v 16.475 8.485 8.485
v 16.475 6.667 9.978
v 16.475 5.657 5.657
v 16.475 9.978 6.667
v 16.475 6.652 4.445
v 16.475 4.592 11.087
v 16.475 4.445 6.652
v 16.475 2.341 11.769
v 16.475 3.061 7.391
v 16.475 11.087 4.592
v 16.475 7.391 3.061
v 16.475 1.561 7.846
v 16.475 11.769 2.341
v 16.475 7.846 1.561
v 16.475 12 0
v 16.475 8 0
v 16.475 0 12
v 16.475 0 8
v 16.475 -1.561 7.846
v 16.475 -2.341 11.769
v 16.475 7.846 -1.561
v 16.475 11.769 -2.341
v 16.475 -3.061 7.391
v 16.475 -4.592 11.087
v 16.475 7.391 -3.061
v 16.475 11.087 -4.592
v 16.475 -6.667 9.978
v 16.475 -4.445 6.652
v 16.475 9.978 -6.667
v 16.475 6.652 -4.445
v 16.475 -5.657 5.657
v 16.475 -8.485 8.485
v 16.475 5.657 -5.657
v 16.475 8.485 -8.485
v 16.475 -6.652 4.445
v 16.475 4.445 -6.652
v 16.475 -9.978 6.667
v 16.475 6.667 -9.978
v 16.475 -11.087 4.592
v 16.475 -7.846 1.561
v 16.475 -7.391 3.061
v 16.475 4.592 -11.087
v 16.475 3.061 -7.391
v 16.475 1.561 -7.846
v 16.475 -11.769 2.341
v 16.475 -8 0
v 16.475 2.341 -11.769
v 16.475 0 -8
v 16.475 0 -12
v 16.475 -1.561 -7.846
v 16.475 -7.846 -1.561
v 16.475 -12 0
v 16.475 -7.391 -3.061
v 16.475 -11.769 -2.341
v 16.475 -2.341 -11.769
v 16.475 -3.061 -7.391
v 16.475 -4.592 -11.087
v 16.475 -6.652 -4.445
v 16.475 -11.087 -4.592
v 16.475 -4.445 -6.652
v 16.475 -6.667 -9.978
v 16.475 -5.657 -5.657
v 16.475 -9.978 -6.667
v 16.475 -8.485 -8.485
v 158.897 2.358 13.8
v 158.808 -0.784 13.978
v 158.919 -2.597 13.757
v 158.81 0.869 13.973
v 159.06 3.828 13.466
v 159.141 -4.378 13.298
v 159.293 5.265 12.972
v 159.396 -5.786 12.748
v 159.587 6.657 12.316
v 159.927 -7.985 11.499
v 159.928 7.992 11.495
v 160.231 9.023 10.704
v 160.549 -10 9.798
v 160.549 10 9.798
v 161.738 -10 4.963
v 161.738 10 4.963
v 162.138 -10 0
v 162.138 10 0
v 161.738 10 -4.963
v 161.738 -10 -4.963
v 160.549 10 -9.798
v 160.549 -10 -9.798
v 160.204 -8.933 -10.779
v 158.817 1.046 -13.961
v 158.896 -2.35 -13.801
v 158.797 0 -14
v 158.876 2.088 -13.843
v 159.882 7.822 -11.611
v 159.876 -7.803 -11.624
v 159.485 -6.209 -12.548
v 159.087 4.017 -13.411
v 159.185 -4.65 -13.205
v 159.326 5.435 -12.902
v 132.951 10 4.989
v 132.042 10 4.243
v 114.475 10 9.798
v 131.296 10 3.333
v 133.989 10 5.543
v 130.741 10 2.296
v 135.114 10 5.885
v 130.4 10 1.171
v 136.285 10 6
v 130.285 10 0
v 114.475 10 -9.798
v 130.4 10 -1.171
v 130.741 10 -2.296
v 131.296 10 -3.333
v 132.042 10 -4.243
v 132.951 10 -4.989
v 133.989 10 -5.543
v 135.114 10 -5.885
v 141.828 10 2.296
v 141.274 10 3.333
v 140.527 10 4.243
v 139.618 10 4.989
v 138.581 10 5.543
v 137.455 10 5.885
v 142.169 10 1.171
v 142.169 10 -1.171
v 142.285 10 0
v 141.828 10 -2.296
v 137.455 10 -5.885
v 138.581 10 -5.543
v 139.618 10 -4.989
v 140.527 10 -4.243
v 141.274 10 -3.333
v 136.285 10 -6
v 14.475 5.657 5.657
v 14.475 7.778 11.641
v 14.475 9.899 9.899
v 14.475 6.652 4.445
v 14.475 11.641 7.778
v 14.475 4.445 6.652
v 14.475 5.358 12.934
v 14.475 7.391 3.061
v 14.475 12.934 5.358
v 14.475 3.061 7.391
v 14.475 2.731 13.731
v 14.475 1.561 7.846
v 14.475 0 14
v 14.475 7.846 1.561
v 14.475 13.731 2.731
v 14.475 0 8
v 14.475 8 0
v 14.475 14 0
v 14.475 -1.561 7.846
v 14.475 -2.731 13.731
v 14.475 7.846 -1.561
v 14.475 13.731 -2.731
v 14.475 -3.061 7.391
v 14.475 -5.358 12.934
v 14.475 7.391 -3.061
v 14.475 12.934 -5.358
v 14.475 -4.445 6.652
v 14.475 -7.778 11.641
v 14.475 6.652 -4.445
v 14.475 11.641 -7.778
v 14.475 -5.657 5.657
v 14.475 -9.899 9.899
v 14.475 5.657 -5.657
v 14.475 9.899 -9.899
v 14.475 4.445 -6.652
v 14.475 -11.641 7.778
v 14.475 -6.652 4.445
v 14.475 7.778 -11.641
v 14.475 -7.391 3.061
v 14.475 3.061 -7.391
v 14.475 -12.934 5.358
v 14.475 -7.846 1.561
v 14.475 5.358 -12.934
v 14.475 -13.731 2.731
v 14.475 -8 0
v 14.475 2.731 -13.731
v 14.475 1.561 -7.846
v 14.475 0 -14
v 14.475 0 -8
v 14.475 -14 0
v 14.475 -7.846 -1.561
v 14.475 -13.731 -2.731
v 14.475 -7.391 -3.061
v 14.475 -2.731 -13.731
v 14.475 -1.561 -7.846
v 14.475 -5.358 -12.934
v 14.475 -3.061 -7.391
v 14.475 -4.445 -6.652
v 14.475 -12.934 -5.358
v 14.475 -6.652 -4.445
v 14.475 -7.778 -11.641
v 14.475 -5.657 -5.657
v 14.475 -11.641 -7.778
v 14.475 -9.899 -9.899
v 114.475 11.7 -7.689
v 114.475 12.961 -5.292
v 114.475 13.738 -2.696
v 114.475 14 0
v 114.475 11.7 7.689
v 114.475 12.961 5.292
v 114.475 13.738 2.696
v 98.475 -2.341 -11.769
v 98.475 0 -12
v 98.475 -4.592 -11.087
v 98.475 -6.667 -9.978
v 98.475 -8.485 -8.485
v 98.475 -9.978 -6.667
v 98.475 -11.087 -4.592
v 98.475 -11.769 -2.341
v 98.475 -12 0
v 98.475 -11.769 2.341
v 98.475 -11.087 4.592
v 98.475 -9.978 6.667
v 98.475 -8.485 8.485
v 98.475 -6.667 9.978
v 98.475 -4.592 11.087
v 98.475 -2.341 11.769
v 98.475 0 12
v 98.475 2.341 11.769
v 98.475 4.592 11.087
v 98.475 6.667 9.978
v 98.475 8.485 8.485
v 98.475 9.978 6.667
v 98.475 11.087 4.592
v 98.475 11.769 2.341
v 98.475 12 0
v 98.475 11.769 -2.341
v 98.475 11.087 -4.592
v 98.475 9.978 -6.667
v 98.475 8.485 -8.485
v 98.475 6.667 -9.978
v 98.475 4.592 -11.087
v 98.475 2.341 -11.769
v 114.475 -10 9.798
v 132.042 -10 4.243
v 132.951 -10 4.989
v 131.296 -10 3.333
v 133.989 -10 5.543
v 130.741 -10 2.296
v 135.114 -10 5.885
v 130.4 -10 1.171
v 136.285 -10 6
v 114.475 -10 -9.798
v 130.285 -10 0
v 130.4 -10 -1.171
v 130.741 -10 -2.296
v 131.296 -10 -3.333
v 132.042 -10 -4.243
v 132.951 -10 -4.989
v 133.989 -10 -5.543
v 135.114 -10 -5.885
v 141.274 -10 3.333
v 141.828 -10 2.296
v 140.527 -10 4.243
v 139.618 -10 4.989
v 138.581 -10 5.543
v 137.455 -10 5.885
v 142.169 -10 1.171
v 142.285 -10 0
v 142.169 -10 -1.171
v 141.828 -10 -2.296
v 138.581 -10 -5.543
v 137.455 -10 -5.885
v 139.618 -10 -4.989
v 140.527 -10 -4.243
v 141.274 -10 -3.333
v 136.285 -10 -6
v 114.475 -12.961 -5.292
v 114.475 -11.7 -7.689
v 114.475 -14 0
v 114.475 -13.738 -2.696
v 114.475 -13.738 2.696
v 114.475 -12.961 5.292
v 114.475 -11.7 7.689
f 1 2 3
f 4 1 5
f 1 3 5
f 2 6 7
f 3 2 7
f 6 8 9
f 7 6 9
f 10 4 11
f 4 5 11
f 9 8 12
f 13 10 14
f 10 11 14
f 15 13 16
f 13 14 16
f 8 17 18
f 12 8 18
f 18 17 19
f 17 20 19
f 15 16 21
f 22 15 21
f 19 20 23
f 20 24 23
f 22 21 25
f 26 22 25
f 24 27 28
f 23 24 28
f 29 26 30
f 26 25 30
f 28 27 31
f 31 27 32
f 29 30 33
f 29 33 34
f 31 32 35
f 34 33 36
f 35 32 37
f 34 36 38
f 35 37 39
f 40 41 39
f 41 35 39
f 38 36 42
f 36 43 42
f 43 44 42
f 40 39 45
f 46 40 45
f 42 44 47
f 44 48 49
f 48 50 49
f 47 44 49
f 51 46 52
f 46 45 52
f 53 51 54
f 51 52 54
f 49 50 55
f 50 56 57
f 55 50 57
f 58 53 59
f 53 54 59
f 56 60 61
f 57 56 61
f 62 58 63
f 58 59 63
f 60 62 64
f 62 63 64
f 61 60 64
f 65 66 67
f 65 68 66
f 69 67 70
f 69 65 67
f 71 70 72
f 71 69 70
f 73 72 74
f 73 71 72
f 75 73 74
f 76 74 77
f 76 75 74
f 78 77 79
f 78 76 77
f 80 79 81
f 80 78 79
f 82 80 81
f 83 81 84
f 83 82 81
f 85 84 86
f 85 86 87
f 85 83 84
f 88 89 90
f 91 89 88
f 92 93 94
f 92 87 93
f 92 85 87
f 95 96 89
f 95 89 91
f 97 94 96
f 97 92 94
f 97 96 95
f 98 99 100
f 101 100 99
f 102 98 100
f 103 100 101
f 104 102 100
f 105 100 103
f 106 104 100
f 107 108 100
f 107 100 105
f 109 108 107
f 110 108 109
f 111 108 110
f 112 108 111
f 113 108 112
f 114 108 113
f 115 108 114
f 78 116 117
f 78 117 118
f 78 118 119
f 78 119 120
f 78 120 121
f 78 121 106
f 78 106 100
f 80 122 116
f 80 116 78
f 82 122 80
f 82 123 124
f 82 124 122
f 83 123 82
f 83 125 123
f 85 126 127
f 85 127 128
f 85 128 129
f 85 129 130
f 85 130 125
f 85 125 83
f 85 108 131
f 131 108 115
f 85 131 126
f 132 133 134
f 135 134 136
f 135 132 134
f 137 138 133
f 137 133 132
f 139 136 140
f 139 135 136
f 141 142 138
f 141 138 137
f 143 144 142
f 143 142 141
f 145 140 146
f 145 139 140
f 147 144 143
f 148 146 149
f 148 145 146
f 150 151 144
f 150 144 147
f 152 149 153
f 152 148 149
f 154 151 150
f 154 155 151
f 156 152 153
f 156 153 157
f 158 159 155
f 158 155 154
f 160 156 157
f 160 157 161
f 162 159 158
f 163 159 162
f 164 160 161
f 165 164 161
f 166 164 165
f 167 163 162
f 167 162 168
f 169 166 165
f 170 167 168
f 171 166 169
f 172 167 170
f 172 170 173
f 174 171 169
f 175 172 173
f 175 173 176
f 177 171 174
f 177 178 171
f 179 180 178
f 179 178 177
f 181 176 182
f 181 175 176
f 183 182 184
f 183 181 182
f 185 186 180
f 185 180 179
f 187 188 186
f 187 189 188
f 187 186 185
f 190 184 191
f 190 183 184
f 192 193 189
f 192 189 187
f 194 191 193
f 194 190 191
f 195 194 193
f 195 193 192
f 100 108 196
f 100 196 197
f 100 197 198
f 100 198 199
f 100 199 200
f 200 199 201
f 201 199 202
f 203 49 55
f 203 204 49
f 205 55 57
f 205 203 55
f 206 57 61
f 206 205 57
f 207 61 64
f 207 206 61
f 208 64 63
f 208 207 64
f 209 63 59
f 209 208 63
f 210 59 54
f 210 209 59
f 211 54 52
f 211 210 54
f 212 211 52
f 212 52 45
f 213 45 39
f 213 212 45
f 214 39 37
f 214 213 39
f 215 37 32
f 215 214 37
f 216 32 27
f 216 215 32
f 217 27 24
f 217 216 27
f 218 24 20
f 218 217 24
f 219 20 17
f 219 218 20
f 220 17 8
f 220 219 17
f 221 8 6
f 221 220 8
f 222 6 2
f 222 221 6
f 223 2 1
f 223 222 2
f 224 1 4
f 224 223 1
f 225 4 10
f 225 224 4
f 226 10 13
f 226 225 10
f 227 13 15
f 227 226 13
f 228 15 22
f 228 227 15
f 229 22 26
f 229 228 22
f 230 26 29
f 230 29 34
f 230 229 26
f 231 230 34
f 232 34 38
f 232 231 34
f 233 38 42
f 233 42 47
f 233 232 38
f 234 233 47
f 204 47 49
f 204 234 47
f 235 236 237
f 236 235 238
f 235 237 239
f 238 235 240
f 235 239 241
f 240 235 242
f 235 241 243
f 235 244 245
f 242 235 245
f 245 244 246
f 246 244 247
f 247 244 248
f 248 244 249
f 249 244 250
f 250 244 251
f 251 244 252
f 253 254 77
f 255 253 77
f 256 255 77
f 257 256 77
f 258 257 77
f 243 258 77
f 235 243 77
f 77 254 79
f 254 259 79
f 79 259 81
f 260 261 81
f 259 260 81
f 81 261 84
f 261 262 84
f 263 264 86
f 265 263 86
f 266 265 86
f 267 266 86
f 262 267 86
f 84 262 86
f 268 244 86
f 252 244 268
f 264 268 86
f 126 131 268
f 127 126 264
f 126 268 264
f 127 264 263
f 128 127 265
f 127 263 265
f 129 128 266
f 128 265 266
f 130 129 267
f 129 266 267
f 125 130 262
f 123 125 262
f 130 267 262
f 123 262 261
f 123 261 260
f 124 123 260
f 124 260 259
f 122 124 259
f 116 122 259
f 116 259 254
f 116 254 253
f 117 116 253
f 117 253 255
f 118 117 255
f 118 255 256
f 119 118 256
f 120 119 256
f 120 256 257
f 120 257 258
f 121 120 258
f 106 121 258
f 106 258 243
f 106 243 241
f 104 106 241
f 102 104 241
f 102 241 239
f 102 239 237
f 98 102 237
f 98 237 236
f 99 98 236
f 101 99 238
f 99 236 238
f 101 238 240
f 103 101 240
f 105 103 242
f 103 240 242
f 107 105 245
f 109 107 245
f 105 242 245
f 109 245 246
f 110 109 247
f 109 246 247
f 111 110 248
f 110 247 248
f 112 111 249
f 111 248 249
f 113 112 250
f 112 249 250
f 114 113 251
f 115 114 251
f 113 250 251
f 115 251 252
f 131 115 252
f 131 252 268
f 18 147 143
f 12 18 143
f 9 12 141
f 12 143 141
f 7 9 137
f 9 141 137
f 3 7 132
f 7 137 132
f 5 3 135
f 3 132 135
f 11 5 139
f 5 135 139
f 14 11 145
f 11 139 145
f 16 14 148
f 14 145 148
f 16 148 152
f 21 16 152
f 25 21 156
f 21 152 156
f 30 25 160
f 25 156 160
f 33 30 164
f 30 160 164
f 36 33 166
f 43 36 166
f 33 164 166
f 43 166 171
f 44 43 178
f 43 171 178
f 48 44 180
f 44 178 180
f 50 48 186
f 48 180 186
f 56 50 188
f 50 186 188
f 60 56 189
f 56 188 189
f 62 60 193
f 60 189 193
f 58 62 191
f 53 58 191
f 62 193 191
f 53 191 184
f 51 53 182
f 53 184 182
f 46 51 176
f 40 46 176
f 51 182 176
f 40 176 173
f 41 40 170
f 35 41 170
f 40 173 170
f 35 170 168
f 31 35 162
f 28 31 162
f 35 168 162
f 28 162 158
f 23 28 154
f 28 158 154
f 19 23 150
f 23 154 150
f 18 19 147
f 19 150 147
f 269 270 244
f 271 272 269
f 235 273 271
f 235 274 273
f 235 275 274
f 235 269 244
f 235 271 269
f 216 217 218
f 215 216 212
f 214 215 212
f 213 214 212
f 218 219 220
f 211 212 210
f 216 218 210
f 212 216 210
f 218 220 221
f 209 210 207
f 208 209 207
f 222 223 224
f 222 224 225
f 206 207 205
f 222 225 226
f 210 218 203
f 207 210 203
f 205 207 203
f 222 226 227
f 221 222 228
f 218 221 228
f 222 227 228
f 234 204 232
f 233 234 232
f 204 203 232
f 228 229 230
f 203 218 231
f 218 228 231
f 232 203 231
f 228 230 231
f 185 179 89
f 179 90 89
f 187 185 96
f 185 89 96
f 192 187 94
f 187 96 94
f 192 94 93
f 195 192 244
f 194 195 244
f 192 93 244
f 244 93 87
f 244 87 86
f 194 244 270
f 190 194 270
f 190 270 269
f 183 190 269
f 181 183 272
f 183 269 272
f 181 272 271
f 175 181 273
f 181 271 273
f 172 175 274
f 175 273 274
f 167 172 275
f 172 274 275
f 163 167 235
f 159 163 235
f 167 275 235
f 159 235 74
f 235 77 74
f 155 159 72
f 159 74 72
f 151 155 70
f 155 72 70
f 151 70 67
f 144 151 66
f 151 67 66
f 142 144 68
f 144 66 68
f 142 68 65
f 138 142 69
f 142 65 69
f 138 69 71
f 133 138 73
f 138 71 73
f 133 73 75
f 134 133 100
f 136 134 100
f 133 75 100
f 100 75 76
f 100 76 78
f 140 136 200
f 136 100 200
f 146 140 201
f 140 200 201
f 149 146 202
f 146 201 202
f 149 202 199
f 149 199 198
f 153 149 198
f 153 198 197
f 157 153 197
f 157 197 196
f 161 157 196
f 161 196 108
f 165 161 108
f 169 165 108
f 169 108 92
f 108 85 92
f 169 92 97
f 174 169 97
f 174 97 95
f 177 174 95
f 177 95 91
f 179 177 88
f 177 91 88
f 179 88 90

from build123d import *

# Parameters (mm, degrees)
SKETCH1_W           = 100
SKETCH1_H           = 2
BOSS_EXTRUDE1_START = -16
SKETCH2_R           = 12
BOSS_EXTRUDE1_DEPTH = 16
SKETCH3_R           = 31
BOSS_EXTRUDE2_DEPTH = 10
SKETCH4_OUTSIDE_W   = 96.516
SKETCH4_OUTSIDE_H   = 62.516
SKETCH4_OUTSIDE_R   = 14
CUT_EXTRUDE1_DEPTH  = 152.530264345
SKETCH5_R           = 6
CUT_EXTRUDE2_DEPTH  = 165.501660515
SKETCH6_R           = 12
SKETCH6_R_2         = 8
BOSS_EXTRUDE3_DEPTH = 2


with BuildPart() as part:
    # Sketch1 → Revolve1 (revolve)
    with BuildSketch(Plane(origin=(0, 0, 0), x_dir=(1, 0, 0), z_dir=(0, 1, 0))):
        with Locations((64.475, 13)):
            Rectangle(SKETCH1_W, SKETCH1_H)
    revolve(axis=Axis((134.425, 0, 0), (-1, 0, 0)))

    # Sketch2 → Boss-Extrude1 (add)
    with BuildSketch(Plane(origin=(114.475, 0, 0), x_dir=(0, 0, -1), z_dir=(1, 0, 0)).offset(BOSS_EXTRUDE1_START)):
        Circle(SKETCH2_R)
    extrude(amount=BOSS_EXTRUDE1_DEPTH)

    # Sketch3 → Boss-Extrude2 (add, symmetric)
    with BuildSketch(Plane(origin=(0, 0, 0), x_dir=(1, 0, 0), z_dir=(0, 1, 0))):
        with Locations((131.13820115, 0)):
            Circle(SKETCH3_R)
    extrude(amount=BOSS_EXTRUDE2_DEPTH, both=True)

    # Sketch4 outside → Cut-Extrude1 (cut, through all)
    with BuildSketch(Plane.ZY.offset(-14.475)):
        Rectangle(SKETCH4_OUTSIDE_W, SKETCH4_OUTSIDE_H)
        with Locations(Location((0, 0, 0), (0, 0, 180))):
            Circle(SKETCH4_OUTSIDE_R, mode=Mode.SUBTRACT)
    extrude(amount=-CUT_EXTRUDE1_DEPTH, mode=Mode.SUBTRACT)

    # Sketch5 → Cut-Extrude2 (cut, through all)
    with BuildSketch(Plane.XZ.offset(10)):
        with Locations(Location((136.284742261, 0, 0), (0, 0, 270))):
            Circle(SKETCH5_R)
    extrude(amount=-CUT_EXTRUDE2_DEPTH, mode=Mode.SUBTRACT)

    # Sketch6 → Boss-Extrude3 (add)
    with BuildSketch(Plane.ZY.offset(-14.475)):
        with Locations(Location((0, 0, 0), (0, 0, 180))):
            Circle(SKETCH6_R)
        Circle(SKETCH6_R_2, mode=Mode.SUBTRACT)
    extrude(amount=-BOSS_EXTRUDE3_DEPTH)


solid = part.part
